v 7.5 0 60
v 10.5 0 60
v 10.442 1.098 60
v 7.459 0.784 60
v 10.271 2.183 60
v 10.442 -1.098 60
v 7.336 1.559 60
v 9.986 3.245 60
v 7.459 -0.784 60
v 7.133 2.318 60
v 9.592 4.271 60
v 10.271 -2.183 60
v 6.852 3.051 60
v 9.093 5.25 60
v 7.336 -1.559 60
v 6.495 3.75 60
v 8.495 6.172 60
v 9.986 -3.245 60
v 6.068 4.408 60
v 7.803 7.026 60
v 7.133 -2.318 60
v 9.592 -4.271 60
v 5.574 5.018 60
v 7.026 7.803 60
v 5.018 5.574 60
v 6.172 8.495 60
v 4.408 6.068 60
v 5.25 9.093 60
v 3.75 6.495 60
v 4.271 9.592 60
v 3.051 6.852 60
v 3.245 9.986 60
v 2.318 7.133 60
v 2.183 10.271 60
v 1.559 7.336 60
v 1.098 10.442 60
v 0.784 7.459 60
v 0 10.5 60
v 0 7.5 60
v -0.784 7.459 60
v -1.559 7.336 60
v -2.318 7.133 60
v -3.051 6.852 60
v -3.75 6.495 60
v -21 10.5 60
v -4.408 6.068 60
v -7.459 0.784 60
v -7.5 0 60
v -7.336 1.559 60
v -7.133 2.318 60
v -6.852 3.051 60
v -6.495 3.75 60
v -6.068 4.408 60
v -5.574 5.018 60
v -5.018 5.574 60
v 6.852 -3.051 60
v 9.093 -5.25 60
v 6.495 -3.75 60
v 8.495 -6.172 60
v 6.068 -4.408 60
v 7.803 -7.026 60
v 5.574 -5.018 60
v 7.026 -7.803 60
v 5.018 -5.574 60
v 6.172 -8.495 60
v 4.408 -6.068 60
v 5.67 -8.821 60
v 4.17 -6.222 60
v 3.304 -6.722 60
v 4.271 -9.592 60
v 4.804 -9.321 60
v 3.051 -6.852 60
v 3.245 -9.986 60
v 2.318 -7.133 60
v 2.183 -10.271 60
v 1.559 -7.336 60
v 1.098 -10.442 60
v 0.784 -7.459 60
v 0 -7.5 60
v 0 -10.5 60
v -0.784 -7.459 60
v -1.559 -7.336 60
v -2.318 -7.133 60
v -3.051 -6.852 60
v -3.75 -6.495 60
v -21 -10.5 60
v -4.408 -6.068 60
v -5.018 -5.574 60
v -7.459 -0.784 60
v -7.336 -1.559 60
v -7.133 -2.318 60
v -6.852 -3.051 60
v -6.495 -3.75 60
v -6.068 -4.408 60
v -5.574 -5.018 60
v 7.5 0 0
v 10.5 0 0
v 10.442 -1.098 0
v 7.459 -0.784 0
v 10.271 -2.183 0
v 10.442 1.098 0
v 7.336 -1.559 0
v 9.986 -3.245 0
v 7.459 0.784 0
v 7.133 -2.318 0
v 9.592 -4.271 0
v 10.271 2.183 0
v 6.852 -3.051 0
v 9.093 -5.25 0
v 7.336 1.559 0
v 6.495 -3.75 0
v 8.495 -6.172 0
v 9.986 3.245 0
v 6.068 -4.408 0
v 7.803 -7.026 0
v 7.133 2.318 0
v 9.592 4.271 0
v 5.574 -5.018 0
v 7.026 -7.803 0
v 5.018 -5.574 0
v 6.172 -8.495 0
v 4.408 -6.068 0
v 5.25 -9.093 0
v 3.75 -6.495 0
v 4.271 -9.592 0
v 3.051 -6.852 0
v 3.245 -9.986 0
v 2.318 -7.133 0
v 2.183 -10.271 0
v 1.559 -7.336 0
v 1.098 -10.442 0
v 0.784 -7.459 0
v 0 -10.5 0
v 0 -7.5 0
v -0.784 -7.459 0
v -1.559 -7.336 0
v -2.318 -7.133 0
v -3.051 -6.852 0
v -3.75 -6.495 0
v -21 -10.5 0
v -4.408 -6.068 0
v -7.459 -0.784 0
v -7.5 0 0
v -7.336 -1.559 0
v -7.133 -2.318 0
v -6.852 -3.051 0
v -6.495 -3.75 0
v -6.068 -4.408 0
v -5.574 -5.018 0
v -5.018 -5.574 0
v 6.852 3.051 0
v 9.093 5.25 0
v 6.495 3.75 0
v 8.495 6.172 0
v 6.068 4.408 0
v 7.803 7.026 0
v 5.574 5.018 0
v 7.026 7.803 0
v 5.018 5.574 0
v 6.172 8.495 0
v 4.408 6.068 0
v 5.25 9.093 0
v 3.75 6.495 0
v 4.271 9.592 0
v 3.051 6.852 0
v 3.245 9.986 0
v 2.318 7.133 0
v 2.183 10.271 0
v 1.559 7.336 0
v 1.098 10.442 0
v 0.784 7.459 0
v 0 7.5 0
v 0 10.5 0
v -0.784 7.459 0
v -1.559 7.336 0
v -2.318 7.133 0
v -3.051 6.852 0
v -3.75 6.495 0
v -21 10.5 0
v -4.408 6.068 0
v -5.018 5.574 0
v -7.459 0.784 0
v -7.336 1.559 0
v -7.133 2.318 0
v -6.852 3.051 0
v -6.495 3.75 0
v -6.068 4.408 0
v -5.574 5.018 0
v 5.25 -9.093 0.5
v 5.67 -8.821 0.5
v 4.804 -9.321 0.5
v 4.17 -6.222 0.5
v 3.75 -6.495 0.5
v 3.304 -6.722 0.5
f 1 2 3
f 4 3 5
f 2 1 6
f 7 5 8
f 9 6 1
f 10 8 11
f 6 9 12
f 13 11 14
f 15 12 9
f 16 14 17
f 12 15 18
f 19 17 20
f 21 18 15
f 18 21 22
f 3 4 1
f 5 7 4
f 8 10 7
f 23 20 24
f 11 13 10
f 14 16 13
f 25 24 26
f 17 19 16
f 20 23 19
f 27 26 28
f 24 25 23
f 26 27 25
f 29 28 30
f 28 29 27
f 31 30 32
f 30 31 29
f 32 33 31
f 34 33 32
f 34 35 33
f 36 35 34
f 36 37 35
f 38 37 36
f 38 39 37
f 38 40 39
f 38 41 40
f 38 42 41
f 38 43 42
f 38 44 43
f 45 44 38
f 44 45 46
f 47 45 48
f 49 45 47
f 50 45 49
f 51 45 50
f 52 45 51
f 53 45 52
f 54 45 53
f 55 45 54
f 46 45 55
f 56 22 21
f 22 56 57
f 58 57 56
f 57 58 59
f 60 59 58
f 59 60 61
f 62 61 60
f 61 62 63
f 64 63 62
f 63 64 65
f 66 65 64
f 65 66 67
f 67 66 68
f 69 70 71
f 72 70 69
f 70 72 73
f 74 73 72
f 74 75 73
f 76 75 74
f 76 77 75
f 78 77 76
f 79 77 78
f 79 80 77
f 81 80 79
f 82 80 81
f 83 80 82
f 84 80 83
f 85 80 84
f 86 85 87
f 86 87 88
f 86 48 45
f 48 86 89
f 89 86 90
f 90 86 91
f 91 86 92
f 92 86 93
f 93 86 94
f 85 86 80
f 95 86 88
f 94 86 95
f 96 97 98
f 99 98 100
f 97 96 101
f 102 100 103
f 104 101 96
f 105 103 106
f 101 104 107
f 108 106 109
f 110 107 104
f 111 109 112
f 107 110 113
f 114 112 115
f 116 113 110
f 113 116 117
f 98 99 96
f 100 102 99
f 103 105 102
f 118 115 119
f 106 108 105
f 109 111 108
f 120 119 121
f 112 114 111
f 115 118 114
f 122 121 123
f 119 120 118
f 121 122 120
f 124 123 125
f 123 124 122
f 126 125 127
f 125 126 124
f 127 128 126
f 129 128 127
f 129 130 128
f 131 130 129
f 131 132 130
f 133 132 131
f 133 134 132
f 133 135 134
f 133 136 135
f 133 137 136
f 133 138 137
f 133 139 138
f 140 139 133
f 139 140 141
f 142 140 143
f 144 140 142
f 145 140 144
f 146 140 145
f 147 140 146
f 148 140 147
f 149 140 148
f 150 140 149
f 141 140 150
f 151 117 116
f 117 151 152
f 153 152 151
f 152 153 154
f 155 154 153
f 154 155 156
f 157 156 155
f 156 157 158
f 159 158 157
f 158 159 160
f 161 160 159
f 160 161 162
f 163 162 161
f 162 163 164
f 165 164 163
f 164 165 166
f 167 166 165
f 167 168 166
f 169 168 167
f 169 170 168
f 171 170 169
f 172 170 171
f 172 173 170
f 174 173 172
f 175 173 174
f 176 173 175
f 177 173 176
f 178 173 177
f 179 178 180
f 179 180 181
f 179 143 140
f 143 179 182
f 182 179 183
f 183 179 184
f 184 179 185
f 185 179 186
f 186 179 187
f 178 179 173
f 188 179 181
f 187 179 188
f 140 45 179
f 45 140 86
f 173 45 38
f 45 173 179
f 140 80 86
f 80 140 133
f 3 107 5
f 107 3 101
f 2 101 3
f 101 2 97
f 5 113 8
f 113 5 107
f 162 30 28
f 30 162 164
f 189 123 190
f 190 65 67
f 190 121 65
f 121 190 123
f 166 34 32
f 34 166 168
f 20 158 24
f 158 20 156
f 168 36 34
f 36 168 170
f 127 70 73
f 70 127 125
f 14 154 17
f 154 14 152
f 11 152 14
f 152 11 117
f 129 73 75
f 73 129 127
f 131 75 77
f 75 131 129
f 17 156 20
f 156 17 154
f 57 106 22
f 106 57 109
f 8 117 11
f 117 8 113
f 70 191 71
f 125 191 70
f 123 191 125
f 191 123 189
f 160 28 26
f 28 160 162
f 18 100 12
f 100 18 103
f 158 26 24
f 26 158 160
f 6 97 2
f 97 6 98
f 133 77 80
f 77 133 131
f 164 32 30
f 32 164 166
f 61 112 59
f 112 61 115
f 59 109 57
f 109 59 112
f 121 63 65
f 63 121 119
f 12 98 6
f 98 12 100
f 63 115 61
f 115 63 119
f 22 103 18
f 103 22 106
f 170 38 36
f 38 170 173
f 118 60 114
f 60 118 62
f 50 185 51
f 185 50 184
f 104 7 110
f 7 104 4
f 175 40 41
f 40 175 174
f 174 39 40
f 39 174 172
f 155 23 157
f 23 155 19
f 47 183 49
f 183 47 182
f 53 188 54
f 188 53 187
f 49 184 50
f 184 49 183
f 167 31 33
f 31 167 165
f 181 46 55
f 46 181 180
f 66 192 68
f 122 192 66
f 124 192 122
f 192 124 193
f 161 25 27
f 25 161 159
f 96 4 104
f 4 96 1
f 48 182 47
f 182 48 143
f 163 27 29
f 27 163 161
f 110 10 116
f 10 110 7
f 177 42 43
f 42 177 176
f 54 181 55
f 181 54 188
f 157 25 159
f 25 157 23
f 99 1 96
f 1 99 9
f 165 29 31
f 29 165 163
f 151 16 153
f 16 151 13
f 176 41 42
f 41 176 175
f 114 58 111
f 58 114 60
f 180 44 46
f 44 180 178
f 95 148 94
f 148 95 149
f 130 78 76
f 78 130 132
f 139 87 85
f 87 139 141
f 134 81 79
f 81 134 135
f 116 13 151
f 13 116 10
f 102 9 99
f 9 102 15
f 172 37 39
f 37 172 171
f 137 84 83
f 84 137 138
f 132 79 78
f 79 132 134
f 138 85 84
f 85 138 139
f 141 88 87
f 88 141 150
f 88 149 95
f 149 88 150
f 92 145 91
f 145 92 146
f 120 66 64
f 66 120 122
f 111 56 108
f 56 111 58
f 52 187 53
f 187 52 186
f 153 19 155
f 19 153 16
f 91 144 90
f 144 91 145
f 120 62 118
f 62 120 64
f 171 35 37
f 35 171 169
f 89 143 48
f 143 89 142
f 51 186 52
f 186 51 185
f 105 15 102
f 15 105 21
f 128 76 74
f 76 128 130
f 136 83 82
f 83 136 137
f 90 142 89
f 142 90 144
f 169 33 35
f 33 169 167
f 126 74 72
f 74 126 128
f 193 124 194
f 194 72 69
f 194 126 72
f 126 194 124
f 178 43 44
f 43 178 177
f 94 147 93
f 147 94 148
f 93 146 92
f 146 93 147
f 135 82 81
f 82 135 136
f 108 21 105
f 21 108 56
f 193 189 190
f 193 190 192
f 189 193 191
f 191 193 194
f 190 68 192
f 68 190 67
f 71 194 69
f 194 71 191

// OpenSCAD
// PRUSA iteration3
// Bearing holders
// GNU GPL v3
// Josef Průša <iam@josefprusa.cz> and contributors
// http://www.reprap.org/wiki/Prusa_Mendel
// http://prusamendel.org

bearing_diameter = 15;

module horizontal_bearing_base(bearings=1){
 translate(v=[0,0,6]) cube(size = [24,8+bearings*25,12], center = true);	
}
module horizontal_bearing_holes(bearings=1){
 cutter_lenght = 10+bearings*25;
 one_holder_lenght = 8+25;
 holder_lenght = 8+bearings*25;
 
 // Main bearing cut
 difference(){
  translate(v=[0,0,12+1.5]) rotate(a=[90,0,0]) translate(v=[0,0,-cutter_lenght/2]) cylinder(h = cutter_lenght, r=bearing_diameter/2, $fn=50);
  // Bearing retainers
  translate(v=[0,1-holder_lenght/2,3+1.5]) cube(size = [24,6,8], center = true);
  translate(v=[0,-1+holder_lenght/2,3+1.5]) cube(size = [24,6,8], center = true);
 }
 
 // Ziptie cutouts
 ziptie_cut_ofset = 0;
 for ( i = [0 : bearings-1] ){
  // For easier positioning I move them by half of one 
  // bearing holder then add each bearign lenght and then center again
  translate(v=[0,-holder_lenght/2,0]) translate(v=[0,one_holder_lenght/2+i*25,0]) difference(){
   union(){
    translate(v=[0,2-6,12]) rotate(a=[90,0,0]) translate(v=[0,0,0]) cylinder(h = 4, r=12.5, $fn=50);
    translate(v=[0,2+6,12]) rotate(a=[90,0,0]) translate(v=[0,0,0]) cylinder(h = 4, r=12.5, $fn=50);
   }
   translate(v=[0,10,12]) rotate(a=[90,0,0]) translate(v=[0,0,0]) cylinder(h = 24, r=10, $fn=50);
  }
 }
 
}

module horizontal_bearing_test(){
 difference(){
  horizontal_bearing_base(1);
  horizontal_bearing_holes(1);
 }
 translate(v=[30,0,0]) difference(){
  horizontal_bearing_base(2);
  horizontal_bearing_holes(2);
 }
 translate(v=[60,0,0]) difference(){
  horizontal_bearing_base(3);
  horizontal_bearing_holes(3);
 }
}



thinwall = 3;
bearing_size = bearing_diameter + 2 * thinwall;

module vertical_bearing_base(){
 translate(v=[-bearing_size/2,0,30]) cube(size = [bearing_size,bearing_size,60], center = true);
 cylinder(h = 60, r=bearing_size/2, $fn = 60);
}

module vertical_bearing_holes(){
  translate(v=[0,0,-1]) cylinder(h = 62, r=bearing_diameter/2, $fn = 60);
  rotate(a=[0,0,-60]) translate(v=[10,0,31.5]) cube(size = [10,1,62], center = true);
}

difference(){
vertical_bearing_base();
vertical_bearing_holes();
}
